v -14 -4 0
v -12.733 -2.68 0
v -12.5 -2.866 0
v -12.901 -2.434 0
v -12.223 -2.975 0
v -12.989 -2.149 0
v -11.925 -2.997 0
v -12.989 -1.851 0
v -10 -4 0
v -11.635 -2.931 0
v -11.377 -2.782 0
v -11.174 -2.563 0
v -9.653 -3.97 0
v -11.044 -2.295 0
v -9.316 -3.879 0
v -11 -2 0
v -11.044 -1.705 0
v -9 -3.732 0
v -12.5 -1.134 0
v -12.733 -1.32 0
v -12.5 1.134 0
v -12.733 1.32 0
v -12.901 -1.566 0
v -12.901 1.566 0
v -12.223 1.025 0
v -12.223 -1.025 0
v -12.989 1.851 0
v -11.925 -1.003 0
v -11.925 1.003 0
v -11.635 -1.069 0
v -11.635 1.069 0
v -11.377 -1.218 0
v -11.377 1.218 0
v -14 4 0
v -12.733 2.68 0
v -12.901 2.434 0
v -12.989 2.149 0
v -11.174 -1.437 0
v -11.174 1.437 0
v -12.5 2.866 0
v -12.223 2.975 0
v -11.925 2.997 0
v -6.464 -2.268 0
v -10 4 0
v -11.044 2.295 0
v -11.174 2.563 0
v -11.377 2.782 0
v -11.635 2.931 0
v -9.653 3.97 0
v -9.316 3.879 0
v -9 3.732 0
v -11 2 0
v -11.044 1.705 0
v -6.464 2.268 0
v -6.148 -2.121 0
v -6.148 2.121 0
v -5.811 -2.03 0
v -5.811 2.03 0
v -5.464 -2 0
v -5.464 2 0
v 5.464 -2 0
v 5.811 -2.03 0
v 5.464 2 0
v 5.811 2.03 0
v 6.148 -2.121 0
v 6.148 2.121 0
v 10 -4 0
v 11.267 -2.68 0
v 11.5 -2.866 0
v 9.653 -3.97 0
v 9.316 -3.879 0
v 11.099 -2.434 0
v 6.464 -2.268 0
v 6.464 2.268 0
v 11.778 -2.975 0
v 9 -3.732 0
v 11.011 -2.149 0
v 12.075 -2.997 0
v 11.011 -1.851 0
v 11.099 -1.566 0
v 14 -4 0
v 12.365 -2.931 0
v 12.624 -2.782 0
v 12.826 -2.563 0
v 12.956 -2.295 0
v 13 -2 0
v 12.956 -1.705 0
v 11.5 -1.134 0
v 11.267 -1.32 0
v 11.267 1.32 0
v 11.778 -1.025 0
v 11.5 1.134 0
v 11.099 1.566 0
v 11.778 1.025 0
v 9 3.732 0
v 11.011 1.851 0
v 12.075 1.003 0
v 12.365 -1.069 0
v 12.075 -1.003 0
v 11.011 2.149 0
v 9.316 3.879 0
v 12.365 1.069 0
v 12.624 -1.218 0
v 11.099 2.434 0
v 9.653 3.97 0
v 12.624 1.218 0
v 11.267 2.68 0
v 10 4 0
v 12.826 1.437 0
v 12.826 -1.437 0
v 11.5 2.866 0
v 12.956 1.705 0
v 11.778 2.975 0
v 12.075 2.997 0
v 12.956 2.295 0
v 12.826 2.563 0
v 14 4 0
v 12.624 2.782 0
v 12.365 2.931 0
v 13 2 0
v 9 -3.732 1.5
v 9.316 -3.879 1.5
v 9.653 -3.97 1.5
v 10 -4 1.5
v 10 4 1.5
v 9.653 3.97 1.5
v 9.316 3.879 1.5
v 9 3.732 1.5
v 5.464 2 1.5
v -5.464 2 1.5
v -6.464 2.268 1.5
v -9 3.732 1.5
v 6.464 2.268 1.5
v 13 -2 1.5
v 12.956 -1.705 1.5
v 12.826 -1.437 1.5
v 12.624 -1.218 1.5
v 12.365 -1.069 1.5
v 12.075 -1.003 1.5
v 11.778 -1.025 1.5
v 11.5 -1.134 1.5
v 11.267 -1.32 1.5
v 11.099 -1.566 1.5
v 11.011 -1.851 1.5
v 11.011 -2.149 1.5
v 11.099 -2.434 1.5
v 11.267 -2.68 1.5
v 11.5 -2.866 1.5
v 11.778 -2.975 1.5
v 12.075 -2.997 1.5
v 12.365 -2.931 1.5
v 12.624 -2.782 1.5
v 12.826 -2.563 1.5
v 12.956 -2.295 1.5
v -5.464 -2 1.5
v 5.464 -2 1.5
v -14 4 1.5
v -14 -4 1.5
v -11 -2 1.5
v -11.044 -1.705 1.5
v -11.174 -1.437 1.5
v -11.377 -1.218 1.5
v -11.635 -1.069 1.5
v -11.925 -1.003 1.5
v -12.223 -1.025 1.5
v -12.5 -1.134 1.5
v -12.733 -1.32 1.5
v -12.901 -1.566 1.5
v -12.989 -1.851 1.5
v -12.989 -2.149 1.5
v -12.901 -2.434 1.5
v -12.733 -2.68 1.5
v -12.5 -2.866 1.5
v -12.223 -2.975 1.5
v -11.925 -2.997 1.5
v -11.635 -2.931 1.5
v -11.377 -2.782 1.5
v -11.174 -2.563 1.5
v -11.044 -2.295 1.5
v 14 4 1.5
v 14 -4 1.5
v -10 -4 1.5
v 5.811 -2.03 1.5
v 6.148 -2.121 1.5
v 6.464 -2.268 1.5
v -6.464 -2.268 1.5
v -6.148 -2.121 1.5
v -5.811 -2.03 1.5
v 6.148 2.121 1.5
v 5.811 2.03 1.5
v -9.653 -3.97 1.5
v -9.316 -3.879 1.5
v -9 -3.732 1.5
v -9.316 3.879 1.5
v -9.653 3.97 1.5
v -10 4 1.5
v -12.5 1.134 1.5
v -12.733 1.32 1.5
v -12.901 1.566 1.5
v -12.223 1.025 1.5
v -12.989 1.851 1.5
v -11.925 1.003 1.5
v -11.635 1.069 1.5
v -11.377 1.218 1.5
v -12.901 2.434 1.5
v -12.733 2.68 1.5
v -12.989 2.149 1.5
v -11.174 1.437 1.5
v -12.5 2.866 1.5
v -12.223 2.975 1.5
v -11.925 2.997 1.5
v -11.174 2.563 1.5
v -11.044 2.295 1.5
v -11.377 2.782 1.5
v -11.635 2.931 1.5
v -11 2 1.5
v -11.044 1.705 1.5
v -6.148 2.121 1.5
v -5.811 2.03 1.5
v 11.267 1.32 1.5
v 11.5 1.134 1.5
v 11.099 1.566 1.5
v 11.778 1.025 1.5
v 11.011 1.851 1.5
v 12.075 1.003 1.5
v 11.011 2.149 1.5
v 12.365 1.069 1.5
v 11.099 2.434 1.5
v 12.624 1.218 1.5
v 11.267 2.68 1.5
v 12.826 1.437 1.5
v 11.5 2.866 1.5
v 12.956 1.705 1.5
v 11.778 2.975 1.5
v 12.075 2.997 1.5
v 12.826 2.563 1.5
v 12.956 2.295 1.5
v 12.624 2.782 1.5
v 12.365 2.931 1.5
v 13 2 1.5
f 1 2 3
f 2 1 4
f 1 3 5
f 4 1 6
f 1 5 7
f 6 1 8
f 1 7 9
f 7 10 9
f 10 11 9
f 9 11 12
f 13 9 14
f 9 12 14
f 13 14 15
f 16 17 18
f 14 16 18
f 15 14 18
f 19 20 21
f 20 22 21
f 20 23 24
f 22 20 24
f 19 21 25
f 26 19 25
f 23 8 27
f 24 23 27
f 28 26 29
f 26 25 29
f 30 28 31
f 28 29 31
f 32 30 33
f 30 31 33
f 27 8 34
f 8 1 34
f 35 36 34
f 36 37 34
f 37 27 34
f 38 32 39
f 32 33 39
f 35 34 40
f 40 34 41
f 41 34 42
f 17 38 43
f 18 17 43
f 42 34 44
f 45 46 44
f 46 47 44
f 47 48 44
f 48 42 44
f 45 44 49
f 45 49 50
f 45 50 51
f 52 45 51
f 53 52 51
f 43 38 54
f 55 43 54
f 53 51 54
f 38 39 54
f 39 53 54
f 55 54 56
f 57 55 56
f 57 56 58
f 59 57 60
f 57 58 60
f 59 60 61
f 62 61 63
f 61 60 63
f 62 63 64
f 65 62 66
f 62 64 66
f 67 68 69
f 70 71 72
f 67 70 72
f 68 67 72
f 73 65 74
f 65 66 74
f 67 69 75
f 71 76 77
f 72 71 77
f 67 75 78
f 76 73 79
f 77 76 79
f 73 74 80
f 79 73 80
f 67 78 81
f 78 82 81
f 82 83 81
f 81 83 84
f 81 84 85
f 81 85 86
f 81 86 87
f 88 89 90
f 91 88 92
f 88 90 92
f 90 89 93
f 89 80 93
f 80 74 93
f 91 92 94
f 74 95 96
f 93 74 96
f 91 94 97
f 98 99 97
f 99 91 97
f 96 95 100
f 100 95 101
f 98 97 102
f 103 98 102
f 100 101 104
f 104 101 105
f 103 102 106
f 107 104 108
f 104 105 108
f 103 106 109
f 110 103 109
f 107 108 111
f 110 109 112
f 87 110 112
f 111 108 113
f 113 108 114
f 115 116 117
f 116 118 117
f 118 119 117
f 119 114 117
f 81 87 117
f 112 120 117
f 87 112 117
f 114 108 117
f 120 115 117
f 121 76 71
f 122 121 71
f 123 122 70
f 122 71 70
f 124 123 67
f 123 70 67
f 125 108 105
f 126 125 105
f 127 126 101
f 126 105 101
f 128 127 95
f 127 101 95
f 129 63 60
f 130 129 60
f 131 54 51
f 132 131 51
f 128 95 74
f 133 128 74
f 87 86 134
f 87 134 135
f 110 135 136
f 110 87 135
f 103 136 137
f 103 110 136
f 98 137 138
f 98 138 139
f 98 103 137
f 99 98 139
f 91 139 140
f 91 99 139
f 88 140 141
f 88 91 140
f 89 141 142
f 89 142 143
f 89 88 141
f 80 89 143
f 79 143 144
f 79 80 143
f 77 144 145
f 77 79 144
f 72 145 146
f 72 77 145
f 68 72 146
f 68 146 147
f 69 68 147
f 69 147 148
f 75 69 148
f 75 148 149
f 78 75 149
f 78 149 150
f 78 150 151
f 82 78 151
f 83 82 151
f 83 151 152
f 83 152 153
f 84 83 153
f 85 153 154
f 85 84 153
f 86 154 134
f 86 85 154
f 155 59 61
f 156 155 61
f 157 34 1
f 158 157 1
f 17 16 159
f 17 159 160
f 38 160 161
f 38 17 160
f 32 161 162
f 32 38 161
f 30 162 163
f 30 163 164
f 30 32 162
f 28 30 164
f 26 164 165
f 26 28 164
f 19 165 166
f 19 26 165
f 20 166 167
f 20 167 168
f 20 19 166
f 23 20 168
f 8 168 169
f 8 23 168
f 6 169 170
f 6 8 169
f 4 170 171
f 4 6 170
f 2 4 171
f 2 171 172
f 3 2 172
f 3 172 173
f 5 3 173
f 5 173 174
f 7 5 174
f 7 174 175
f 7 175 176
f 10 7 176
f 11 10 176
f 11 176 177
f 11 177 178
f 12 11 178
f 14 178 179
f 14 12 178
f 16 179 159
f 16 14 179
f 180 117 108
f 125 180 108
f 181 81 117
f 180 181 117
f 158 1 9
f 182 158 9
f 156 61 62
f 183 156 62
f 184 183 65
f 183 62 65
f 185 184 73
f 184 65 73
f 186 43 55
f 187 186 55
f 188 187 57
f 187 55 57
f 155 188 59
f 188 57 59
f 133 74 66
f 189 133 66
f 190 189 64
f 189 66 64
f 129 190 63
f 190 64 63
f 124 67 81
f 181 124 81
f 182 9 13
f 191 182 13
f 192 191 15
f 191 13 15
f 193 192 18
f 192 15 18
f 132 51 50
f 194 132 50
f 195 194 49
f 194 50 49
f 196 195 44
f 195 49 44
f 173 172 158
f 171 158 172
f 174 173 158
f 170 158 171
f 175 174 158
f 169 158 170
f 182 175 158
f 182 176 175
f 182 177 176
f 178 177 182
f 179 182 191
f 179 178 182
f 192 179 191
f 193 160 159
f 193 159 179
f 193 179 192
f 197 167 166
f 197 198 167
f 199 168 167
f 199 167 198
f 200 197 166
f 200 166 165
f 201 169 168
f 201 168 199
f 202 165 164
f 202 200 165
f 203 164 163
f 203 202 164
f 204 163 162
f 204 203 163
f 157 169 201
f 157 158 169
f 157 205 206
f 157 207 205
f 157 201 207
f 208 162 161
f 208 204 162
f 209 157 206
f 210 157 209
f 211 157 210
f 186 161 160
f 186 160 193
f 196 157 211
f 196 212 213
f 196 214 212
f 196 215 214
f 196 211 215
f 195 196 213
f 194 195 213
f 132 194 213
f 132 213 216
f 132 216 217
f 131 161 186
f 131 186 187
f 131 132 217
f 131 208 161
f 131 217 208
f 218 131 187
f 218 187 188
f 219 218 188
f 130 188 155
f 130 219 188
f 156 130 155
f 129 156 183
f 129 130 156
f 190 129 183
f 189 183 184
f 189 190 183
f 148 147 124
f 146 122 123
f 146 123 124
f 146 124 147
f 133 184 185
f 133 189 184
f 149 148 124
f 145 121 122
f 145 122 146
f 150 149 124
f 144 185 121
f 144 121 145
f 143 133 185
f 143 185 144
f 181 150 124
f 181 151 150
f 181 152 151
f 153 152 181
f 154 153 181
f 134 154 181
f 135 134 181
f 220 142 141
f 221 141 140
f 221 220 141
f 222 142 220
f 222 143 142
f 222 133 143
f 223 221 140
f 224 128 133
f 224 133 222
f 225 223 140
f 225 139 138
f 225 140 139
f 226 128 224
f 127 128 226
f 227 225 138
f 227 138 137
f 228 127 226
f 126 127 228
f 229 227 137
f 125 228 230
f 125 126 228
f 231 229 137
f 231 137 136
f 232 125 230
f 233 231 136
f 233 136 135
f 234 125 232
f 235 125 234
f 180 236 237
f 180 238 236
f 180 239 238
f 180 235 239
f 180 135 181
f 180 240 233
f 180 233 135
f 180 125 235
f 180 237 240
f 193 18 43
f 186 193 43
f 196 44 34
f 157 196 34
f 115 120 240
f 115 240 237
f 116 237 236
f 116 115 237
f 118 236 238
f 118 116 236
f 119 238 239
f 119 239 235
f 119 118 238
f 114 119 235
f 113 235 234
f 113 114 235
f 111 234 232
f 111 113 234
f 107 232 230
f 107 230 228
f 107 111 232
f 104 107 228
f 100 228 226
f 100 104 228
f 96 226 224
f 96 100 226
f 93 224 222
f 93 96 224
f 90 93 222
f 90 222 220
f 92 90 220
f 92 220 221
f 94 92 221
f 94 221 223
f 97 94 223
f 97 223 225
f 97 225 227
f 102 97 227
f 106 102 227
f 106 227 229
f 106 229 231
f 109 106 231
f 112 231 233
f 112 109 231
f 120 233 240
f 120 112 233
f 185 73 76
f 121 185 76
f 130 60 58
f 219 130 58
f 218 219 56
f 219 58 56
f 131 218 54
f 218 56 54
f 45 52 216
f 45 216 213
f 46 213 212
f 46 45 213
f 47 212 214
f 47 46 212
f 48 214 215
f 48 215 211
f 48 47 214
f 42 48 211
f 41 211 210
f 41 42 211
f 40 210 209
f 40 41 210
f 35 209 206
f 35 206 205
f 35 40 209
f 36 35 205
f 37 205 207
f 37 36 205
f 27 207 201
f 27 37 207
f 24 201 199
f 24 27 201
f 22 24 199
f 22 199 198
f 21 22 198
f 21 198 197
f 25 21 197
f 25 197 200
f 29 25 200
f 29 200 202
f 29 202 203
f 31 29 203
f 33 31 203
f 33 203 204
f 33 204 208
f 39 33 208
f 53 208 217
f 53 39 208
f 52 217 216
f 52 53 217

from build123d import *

# Parameters (mm, degrees)
F0_R     = 1
F1_DEPTH = 1.5


# Not quite as in the source:
# - ends of sketch curves that miss each other by under 0.0002 mm in the source are joined


with BuildPart() as f1:
    # F0 (on Top) → F1 (new body)
    with BuildSketch(Plane.XY):
        with BuildLine():
            Line((6.464165, -2.26795), (9.000064, -3.732051))
            ThreePointArc((9.000064, -3.732051), (9.4824259563, -3.931851665), (10.000064, -4))
            Line((10.000064, -4), (14.000064, -4))
            Line((14.000064, -4), (14.000064, 4))
            Line((14.000064, 4), (10.000064, 4))
            ThreePointArc((10.000064, 4), (9.4824257148, 3.9318516003), (9.0000636503, 3.7320506057))
            Line((9.0000636503, 3.7320506057), (6.464165, 2.267949))
            ThreePointArc((6.464165, 2.267949), (5.9817417072, 2.0681319009), (5.464038, 2.000000004))
            Line((5.464038, 2.000000004), (-5.464038, 2))
            ThreePointArc((-5.464038, 2), (-5.9817422242, 2.0681317715), (-6.4641659167, 2.2679491443))
            Line((-6.4641659167, 2.2679491443), (-9.000064, 3.73205))
            ThreePointArc((-9.000064, 3.73205), (-9.4824257148, 3.9318516003), (-10.000064, 4))
            Line((-10.000064, 4), (-14.000064, 4))
            Line((-14.000064, 4), (-14.000064, -4))
            Line((-14.000064, -4), (-10.000064, -4))
            ThreePointArc((-10.000064, -4), (-9.4824259563, -3.931851665), (-9.0000640833, -3.7320508557))
            Line((-9.0000640833, -3.7320508557), (-6.464166, -2.26795))
            ThreePointArc((-6.464166, -2.26795), (-5.9817424657, -2.0681318362), (-5.464038, -2.0000000041))
            Line((-5.464038, -2.0000000041), (5.464038, -2))
            ThreePointArc((5.464038, -2), (5.9817419487, -2.0681319656), (6.464165, -2.26795))
        make_face()
        with Locations((-12.000064, -2)):
            Circle(F0_R, mode=Mode.SUBTRACT)
        with Locations((12.000064, -2)):
            Circle(F0_R, mode=Mode.SUBTRACT)
        with Locations((-12.000064, 2)):
            Circle(F0_R, mode=Mode.SUBTRACT)
        with Locations((12.000064, 2)):
            Circle(F0_R, mode=Mode.SUBTRACT)
    extrude(amount=F1_DEPTH)


solid = f1.part
